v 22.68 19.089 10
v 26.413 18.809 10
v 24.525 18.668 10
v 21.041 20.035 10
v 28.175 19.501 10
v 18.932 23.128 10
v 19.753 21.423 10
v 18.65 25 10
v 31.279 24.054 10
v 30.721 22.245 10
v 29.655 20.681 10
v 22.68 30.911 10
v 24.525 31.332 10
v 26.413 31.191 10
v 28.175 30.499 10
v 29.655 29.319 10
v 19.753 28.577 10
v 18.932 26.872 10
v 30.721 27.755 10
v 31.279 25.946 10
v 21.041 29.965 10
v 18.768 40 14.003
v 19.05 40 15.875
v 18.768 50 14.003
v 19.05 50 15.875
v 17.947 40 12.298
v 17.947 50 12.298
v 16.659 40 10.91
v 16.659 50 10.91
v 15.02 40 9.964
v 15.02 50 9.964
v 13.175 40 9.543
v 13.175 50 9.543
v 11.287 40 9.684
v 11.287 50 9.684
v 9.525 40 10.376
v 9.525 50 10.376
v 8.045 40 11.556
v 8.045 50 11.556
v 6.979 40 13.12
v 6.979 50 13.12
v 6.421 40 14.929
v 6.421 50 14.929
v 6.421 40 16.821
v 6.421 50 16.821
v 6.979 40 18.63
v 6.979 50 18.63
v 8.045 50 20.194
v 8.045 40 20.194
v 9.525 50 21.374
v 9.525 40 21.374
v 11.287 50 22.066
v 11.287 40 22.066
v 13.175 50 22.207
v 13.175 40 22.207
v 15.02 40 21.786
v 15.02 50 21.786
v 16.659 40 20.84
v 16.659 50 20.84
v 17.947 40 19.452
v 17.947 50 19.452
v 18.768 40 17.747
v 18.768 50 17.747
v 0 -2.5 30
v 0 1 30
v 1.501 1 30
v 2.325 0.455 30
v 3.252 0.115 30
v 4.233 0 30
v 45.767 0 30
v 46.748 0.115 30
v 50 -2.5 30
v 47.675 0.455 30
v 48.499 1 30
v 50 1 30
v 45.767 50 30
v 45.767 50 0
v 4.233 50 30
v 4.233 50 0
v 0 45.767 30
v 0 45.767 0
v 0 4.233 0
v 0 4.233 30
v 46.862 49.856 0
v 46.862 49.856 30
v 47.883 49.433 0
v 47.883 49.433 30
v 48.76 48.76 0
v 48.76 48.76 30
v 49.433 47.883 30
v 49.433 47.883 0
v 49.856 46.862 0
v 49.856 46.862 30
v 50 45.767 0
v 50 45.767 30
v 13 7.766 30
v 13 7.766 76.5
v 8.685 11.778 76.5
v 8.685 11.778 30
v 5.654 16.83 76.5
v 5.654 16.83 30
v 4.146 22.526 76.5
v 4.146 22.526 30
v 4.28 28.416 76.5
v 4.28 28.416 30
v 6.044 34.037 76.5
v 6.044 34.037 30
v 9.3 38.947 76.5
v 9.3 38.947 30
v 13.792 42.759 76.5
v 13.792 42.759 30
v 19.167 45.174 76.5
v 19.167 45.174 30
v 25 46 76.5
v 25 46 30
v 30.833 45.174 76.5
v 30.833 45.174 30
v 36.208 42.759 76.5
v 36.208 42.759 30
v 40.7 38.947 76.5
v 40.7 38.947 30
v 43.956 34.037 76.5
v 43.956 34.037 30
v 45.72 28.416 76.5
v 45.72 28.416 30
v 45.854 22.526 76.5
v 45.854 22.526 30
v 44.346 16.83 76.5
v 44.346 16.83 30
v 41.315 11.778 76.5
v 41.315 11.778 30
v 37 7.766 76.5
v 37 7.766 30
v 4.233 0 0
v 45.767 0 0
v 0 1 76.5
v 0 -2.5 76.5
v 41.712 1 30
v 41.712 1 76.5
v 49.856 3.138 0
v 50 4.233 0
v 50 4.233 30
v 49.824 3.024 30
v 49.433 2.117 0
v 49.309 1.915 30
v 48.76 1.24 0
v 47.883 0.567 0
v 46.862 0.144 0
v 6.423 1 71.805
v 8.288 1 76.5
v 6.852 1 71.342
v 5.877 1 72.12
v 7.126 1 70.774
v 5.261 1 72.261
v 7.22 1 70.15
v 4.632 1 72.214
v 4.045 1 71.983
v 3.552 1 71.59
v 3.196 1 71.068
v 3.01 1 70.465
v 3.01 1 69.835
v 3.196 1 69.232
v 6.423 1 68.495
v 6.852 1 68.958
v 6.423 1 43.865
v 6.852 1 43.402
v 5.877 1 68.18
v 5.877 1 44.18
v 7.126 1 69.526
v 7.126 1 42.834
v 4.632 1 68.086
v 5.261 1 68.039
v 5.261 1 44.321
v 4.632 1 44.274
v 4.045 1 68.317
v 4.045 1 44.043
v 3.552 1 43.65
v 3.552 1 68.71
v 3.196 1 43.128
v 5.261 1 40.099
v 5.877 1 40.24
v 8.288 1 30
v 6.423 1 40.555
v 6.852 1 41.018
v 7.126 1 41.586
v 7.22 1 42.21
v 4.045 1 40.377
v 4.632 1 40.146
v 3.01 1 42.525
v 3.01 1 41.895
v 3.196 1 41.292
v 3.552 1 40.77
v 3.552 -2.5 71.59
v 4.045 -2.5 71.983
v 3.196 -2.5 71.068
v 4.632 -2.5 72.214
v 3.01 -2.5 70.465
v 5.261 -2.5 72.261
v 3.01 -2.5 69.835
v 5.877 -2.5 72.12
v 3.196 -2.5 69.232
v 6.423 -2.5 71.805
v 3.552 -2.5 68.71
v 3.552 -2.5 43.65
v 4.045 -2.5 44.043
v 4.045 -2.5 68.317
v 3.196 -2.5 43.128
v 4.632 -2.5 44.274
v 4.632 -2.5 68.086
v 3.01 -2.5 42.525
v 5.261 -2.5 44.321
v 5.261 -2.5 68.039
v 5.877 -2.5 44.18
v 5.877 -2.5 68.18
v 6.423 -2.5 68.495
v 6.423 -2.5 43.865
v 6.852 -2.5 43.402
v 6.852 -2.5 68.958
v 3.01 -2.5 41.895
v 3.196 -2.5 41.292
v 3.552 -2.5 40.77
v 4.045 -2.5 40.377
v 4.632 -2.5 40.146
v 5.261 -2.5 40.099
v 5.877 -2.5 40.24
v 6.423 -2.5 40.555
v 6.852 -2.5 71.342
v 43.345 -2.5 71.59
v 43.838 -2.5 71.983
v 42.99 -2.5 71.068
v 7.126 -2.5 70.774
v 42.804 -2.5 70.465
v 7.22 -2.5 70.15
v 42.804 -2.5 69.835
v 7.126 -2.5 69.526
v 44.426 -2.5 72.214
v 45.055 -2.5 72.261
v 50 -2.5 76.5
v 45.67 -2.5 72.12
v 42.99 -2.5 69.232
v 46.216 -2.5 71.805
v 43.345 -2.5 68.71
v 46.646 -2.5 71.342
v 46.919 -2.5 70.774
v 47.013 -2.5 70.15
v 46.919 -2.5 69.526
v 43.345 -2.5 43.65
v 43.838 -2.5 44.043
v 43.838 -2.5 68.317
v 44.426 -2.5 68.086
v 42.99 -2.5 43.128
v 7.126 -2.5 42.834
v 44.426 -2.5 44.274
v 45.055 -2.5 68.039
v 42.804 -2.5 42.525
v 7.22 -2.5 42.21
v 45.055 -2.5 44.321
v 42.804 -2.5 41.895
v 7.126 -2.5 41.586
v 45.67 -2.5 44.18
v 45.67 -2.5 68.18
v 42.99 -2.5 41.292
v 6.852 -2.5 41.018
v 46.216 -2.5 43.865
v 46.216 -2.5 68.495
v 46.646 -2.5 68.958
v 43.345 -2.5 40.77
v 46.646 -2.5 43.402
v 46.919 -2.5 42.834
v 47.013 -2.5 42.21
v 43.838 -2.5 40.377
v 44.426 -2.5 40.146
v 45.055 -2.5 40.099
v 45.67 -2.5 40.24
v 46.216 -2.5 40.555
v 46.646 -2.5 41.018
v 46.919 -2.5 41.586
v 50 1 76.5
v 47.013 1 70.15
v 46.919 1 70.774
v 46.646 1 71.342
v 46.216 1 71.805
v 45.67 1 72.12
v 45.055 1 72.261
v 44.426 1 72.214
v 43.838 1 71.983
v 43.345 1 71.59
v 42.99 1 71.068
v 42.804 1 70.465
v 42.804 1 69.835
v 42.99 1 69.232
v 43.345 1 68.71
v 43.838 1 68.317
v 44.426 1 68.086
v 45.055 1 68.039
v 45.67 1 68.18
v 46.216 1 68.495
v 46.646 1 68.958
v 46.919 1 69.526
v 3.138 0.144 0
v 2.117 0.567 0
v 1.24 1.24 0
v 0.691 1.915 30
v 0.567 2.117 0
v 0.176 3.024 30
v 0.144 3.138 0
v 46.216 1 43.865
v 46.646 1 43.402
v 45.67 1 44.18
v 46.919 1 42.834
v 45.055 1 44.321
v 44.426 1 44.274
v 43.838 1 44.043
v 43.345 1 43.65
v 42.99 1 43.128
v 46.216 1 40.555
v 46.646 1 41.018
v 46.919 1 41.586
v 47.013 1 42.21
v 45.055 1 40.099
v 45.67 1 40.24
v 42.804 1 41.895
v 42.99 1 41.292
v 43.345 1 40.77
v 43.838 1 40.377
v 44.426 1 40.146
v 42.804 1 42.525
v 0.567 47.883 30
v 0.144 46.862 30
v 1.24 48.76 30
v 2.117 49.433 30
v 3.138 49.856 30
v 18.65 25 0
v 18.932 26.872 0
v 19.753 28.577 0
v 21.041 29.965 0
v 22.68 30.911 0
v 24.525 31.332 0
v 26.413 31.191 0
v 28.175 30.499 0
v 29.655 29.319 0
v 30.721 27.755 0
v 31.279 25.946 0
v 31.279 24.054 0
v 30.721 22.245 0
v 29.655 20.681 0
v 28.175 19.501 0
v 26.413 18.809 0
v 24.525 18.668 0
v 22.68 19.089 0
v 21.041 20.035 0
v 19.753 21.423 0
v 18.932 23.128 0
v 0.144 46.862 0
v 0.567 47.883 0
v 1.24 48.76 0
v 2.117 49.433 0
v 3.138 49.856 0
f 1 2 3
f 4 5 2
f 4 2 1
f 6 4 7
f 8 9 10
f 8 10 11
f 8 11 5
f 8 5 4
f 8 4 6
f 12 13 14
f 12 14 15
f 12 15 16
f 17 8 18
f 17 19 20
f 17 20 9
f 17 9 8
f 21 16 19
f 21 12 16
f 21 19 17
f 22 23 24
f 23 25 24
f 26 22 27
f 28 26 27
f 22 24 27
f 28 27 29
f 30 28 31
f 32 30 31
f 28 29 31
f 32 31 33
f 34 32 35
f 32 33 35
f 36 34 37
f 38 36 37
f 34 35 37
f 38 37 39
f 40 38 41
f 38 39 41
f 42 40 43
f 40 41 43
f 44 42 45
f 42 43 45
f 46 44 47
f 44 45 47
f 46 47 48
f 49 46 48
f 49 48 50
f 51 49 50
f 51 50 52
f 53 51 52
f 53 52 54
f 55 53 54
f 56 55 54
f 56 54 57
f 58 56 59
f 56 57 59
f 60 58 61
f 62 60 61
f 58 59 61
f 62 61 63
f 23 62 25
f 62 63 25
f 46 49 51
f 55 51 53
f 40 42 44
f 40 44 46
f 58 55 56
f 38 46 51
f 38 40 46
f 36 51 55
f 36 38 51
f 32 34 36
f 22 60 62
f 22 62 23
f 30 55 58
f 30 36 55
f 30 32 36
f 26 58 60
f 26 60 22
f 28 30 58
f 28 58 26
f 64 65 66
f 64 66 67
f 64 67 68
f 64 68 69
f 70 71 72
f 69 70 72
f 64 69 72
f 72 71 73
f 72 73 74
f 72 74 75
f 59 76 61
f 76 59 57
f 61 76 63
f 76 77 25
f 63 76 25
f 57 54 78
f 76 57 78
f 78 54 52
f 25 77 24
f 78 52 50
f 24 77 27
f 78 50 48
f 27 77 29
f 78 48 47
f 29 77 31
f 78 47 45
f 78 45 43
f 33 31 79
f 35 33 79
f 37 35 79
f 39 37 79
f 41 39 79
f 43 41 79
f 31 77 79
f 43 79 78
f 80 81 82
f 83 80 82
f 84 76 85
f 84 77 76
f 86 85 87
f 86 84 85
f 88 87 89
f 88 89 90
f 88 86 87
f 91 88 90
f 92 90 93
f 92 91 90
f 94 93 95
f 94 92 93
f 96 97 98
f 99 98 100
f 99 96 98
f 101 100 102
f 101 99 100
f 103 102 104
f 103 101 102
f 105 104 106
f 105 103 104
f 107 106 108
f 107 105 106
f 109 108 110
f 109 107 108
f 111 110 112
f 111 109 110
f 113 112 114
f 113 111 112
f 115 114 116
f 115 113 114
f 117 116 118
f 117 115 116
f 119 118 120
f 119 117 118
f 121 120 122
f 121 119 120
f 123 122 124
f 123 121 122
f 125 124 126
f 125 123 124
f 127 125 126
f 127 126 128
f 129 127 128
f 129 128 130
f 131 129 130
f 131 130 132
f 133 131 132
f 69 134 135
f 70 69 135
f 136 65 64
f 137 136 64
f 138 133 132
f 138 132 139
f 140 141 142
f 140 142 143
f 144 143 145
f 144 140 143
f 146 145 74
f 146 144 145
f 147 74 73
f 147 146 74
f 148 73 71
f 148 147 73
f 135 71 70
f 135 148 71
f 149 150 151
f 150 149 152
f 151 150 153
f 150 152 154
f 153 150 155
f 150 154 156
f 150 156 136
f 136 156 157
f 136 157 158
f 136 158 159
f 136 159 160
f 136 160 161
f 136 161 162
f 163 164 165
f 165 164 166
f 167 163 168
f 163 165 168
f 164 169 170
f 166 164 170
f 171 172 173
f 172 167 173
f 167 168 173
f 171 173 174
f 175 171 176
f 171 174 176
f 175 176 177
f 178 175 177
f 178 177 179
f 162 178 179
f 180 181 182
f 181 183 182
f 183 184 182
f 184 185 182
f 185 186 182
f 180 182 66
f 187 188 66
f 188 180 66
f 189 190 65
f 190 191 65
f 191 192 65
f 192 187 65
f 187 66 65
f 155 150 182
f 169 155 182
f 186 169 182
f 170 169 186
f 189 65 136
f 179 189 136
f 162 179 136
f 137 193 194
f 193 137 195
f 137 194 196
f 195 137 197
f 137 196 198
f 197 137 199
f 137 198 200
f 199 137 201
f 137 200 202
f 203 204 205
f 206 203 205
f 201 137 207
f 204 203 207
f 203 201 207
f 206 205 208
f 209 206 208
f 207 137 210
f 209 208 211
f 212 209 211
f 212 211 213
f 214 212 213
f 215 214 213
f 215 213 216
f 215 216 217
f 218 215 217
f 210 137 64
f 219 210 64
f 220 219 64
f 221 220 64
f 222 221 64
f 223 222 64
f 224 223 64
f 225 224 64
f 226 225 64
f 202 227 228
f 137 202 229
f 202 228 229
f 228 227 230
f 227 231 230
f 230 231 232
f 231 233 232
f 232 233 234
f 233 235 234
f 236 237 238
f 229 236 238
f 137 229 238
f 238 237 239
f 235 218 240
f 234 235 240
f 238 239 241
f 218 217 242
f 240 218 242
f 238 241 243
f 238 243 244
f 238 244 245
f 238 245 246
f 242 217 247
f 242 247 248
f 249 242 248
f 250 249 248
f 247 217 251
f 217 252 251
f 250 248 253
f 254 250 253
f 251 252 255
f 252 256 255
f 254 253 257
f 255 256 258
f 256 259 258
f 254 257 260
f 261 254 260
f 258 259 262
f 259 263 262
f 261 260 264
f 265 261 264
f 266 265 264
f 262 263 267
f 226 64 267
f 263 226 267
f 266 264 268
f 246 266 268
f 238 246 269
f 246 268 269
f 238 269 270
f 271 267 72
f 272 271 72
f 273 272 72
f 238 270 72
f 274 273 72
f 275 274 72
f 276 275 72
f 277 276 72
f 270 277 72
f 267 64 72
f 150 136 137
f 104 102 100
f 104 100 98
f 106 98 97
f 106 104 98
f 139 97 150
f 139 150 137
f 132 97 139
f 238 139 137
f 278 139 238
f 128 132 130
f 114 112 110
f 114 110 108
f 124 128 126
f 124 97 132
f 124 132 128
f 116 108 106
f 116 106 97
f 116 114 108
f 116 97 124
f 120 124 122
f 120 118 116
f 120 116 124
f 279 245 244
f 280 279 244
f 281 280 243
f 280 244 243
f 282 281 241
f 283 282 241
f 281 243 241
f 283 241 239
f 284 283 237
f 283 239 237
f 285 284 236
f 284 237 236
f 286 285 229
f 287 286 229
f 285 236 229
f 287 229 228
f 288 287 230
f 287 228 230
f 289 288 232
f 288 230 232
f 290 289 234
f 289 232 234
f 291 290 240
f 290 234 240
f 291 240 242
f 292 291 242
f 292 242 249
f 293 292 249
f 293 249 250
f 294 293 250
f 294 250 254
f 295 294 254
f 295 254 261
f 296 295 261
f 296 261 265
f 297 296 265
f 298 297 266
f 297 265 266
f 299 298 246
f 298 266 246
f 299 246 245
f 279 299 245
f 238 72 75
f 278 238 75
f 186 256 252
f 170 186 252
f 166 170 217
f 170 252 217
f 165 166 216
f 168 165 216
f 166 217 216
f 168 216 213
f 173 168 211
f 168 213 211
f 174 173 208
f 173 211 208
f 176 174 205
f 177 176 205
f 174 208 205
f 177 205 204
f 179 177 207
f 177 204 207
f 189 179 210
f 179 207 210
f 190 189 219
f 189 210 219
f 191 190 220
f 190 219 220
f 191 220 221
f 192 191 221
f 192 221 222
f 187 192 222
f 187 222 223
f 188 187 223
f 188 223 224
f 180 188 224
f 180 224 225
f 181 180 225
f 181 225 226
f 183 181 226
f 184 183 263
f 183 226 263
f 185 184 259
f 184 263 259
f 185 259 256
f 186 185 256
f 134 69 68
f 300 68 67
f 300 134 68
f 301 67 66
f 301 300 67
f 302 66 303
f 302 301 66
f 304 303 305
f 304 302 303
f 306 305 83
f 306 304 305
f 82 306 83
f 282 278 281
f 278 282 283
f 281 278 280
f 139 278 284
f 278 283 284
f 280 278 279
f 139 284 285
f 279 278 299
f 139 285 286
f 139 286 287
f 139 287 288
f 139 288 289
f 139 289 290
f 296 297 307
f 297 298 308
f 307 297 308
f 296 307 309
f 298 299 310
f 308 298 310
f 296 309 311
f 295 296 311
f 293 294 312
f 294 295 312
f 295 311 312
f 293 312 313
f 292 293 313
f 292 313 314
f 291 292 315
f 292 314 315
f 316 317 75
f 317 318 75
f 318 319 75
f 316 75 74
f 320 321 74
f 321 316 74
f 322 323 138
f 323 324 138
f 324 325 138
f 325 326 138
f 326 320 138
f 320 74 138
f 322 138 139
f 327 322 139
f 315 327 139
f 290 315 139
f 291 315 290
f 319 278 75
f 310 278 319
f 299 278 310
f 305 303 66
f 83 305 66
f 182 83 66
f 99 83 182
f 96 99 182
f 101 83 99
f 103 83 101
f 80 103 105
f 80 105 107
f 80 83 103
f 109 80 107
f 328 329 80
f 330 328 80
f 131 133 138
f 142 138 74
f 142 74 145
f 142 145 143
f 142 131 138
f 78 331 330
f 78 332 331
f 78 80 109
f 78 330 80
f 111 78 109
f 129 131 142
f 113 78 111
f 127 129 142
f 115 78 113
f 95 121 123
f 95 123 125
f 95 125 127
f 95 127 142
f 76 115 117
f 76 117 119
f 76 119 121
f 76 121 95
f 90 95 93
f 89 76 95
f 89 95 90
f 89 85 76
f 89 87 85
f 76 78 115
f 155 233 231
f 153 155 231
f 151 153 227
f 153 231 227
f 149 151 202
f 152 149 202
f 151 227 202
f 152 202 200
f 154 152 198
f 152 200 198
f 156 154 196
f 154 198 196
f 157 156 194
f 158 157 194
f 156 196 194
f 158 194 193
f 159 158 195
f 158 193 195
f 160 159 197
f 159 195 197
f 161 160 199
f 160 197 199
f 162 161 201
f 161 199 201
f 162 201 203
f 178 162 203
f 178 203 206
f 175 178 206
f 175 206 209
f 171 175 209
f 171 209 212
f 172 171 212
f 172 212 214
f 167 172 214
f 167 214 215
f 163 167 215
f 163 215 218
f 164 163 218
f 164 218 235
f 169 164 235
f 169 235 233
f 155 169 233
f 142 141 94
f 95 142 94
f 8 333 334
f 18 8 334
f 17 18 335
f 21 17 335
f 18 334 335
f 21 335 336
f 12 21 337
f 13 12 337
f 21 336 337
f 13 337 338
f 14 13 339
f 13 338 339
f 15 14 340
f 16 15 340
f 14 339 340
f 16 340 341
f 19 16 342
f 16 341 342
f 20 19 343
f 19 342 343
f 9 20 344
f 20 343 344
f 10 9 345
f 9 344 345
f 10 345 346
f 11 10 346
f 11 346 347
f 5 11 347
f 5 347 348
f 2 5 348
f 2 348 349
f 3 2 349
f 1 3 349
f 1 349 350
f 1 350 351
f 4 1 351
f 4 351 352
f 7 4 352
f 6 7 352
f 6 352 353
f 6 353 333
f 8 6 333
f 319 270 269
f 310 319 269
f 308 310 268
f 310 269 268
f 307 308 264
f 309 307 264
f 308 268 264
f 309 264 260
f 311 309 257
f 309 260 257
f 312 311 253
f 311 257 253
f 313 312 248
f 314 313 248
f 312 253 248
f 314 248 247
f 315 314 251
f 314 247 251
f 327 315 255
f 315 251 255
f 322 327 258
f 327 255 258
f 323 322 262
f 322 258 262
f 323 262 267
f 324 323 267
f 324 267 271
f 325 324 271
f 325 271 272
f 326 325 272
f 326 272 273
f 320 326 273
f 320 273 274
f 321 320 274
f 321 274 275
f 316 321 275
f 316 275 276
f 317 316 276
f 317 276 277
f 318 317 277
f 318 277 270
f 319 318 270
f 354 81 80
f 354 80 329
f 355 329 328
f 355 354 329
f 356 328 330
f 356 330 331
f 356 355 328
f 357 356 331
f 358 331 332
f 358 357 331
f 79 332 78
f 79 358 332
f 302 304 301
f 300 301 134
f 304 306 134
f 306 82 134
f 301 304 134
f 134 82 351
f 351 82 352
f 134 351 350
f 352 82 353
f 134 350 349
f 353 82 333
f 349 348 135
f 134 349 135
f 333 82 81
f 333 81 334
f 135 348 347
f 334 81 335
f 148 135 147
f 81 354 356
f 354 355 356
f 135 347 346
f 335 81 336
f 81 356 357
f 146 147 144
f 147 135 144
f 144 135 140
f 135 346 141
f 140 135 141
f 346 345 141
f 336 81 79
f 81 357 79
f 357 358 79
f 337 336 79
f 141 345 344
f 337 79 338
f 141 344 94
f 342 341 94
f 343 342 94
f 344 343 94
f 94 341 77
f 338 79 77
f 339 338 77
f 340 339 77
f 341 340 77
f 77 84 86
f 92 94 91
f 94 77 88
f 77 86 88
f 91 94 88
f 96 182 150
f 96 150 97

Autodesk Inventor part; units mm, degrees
ref_plane "YZ Plane" through (0, 0, 0) normal (1, 0, 0) x (0, 1, 0)
ref_plane "XZ Plane" through (0, 0, 0) normal (0, 1, 0) x (-1, 0, 0)
ref_plane "XY Plane" through (0, 0, 0) normal (0, 0, 1) x (1, 0, 0)
sketch "Sketch1" plane through (0, 0, 0) normal (0, 0, 1) x (1, 0, 0)
  line L0 (0, 0) -> (50, 0)
  line L1 (50, 0) -> (50, 50)
  line L2 (50, 50) -> (0, 50)
  line L3 (0, 50) -> (0, 0)
  line L4 (5.3353, 5.3353) -> (44.6647, 5.3353) construction
  line L5 (44.6647, 5.3353) -> (44.6647, 44.6647) construction
  line L6 (44.6647, 44.6647) -> (5.3353, 44.6647) construction
  line L7 (5.3353, 44.6647) -> (5.3353, 5.3353) construction
  line L8 (25, 44.6647) -> (25, 50) construction
  line L9 (44.6647, 25) -> (50, 25) construction
  dimension "d0" = 50
extrude "Extrusion1" add sketch "Sketch1" along normal blind 30
sketch "Sketch2" plane through (0, 0, 30) normal (0, 0, 1) x (1, 0, 0)
  line L0 (0, -2.5) -> (50, -2.5)
  line L1 (50, -2.5) -> (50, 1)
  line L2 (50, 1) -> (0, 1)
  line L3 (0, 1) -> (0, -2.5)
  circle A0 centre (25, 25) radius 21
  line L4 (50, 50) -> (0, 50) construction
  line L5 (50, 0) -> (50, 50) construction
  line L6 (25, 25) -> (25, 50) construction
  line L7 (25, 25) -> (50, 25) construction
  line L8 (13, 7.7663) -> (37, 7.7663)
  line L9 (8.2885, 1) -> (25, 25)
  line L10 (25, 25) -> (41.7115, 1)
  point P0 (0, 0)
  point P1 (0, -0.75)
  point P2 (50, -0.75)
  dimension "d3" = 2.5
  dimension "d4" = 3.5
  dimension "d5" = 42
  dimension "d6" = 24
extrude "Extrusion2" add sketch "Sketch2" along normal blind 46.5
sketch "Sketch3" plane through (0, -2.5, 30) normal (0, -1, 0) x (1, 0, 0)
  line L0 (44.8967, 40.15) -> (5.1033, 40.15) construction
  line L1 (5.1033, 40.15) -> (5.1033, 12.21) construction
  line L2 (5.1033, 12.21) -> (44.8967, 12.21) construction
  line L3 (44.8967, 12.21) -> (44.8967, 40.15) construction
  line L4 (0, 46.5) -> (50, 46.5) construction
  line L5 (25, 40.15) -> (25, 46.5) construction
  circle A0 centre (44.8967, 40.15) radius 2.1167
  circle A1 centre (44.8967, 12.21) radius 2.1167
  circle A2 centre (5.1033, 40.15) radius 2.1167
  circle A3 centre (5.1033, 12.21) radius 2.1167
  point P0 (0, -30)
  dimension "d9" = 27.94
  dimension "d10" = 6.35
  dimension "d11" = 39.7933
  dimension "d12" = 4.2333
extrude "Extrusion3" cut sketch "Sketch3" against normal up to surface (3.5 mm away)
sketch "Sketch4" plane through (0, 0, 0) normal (0, 0, -1) x (-1, 0, 0)
  circle A0 centre (-25, 25) radius 6.35
  line L0 (-50, 50) -> (0, 50) construction
  line L1 (0, 50) -> (0, 0) construction
  point P0 (-25, 50)
  point P1 (0, 25)
  dimension "d15" = 12.7
extrude "Extrusion4" cut sketch "Sketch4" against normal blind 10
sketch "Sketch5" plane through (0, 50, 0) normal (0, 1, 0) x (1, 0, 0)
  circle A0 centre (12.7, -15.875) radius 6.35
  point P0 (0, 0)
  dimension "d18" = 12.7
  dimension "d19" = 12.7
  dimension "d20" = 15.875
extrude "Extrusion5" cut sketch "Sketch5" against normal blind 10
fillet "Fillet1" radius 4.2333 4 edges at (50, 50, 15) (0, 50, 15) (0, 0, 15) (50, 0, 15)
properties part number "Water_pump"
